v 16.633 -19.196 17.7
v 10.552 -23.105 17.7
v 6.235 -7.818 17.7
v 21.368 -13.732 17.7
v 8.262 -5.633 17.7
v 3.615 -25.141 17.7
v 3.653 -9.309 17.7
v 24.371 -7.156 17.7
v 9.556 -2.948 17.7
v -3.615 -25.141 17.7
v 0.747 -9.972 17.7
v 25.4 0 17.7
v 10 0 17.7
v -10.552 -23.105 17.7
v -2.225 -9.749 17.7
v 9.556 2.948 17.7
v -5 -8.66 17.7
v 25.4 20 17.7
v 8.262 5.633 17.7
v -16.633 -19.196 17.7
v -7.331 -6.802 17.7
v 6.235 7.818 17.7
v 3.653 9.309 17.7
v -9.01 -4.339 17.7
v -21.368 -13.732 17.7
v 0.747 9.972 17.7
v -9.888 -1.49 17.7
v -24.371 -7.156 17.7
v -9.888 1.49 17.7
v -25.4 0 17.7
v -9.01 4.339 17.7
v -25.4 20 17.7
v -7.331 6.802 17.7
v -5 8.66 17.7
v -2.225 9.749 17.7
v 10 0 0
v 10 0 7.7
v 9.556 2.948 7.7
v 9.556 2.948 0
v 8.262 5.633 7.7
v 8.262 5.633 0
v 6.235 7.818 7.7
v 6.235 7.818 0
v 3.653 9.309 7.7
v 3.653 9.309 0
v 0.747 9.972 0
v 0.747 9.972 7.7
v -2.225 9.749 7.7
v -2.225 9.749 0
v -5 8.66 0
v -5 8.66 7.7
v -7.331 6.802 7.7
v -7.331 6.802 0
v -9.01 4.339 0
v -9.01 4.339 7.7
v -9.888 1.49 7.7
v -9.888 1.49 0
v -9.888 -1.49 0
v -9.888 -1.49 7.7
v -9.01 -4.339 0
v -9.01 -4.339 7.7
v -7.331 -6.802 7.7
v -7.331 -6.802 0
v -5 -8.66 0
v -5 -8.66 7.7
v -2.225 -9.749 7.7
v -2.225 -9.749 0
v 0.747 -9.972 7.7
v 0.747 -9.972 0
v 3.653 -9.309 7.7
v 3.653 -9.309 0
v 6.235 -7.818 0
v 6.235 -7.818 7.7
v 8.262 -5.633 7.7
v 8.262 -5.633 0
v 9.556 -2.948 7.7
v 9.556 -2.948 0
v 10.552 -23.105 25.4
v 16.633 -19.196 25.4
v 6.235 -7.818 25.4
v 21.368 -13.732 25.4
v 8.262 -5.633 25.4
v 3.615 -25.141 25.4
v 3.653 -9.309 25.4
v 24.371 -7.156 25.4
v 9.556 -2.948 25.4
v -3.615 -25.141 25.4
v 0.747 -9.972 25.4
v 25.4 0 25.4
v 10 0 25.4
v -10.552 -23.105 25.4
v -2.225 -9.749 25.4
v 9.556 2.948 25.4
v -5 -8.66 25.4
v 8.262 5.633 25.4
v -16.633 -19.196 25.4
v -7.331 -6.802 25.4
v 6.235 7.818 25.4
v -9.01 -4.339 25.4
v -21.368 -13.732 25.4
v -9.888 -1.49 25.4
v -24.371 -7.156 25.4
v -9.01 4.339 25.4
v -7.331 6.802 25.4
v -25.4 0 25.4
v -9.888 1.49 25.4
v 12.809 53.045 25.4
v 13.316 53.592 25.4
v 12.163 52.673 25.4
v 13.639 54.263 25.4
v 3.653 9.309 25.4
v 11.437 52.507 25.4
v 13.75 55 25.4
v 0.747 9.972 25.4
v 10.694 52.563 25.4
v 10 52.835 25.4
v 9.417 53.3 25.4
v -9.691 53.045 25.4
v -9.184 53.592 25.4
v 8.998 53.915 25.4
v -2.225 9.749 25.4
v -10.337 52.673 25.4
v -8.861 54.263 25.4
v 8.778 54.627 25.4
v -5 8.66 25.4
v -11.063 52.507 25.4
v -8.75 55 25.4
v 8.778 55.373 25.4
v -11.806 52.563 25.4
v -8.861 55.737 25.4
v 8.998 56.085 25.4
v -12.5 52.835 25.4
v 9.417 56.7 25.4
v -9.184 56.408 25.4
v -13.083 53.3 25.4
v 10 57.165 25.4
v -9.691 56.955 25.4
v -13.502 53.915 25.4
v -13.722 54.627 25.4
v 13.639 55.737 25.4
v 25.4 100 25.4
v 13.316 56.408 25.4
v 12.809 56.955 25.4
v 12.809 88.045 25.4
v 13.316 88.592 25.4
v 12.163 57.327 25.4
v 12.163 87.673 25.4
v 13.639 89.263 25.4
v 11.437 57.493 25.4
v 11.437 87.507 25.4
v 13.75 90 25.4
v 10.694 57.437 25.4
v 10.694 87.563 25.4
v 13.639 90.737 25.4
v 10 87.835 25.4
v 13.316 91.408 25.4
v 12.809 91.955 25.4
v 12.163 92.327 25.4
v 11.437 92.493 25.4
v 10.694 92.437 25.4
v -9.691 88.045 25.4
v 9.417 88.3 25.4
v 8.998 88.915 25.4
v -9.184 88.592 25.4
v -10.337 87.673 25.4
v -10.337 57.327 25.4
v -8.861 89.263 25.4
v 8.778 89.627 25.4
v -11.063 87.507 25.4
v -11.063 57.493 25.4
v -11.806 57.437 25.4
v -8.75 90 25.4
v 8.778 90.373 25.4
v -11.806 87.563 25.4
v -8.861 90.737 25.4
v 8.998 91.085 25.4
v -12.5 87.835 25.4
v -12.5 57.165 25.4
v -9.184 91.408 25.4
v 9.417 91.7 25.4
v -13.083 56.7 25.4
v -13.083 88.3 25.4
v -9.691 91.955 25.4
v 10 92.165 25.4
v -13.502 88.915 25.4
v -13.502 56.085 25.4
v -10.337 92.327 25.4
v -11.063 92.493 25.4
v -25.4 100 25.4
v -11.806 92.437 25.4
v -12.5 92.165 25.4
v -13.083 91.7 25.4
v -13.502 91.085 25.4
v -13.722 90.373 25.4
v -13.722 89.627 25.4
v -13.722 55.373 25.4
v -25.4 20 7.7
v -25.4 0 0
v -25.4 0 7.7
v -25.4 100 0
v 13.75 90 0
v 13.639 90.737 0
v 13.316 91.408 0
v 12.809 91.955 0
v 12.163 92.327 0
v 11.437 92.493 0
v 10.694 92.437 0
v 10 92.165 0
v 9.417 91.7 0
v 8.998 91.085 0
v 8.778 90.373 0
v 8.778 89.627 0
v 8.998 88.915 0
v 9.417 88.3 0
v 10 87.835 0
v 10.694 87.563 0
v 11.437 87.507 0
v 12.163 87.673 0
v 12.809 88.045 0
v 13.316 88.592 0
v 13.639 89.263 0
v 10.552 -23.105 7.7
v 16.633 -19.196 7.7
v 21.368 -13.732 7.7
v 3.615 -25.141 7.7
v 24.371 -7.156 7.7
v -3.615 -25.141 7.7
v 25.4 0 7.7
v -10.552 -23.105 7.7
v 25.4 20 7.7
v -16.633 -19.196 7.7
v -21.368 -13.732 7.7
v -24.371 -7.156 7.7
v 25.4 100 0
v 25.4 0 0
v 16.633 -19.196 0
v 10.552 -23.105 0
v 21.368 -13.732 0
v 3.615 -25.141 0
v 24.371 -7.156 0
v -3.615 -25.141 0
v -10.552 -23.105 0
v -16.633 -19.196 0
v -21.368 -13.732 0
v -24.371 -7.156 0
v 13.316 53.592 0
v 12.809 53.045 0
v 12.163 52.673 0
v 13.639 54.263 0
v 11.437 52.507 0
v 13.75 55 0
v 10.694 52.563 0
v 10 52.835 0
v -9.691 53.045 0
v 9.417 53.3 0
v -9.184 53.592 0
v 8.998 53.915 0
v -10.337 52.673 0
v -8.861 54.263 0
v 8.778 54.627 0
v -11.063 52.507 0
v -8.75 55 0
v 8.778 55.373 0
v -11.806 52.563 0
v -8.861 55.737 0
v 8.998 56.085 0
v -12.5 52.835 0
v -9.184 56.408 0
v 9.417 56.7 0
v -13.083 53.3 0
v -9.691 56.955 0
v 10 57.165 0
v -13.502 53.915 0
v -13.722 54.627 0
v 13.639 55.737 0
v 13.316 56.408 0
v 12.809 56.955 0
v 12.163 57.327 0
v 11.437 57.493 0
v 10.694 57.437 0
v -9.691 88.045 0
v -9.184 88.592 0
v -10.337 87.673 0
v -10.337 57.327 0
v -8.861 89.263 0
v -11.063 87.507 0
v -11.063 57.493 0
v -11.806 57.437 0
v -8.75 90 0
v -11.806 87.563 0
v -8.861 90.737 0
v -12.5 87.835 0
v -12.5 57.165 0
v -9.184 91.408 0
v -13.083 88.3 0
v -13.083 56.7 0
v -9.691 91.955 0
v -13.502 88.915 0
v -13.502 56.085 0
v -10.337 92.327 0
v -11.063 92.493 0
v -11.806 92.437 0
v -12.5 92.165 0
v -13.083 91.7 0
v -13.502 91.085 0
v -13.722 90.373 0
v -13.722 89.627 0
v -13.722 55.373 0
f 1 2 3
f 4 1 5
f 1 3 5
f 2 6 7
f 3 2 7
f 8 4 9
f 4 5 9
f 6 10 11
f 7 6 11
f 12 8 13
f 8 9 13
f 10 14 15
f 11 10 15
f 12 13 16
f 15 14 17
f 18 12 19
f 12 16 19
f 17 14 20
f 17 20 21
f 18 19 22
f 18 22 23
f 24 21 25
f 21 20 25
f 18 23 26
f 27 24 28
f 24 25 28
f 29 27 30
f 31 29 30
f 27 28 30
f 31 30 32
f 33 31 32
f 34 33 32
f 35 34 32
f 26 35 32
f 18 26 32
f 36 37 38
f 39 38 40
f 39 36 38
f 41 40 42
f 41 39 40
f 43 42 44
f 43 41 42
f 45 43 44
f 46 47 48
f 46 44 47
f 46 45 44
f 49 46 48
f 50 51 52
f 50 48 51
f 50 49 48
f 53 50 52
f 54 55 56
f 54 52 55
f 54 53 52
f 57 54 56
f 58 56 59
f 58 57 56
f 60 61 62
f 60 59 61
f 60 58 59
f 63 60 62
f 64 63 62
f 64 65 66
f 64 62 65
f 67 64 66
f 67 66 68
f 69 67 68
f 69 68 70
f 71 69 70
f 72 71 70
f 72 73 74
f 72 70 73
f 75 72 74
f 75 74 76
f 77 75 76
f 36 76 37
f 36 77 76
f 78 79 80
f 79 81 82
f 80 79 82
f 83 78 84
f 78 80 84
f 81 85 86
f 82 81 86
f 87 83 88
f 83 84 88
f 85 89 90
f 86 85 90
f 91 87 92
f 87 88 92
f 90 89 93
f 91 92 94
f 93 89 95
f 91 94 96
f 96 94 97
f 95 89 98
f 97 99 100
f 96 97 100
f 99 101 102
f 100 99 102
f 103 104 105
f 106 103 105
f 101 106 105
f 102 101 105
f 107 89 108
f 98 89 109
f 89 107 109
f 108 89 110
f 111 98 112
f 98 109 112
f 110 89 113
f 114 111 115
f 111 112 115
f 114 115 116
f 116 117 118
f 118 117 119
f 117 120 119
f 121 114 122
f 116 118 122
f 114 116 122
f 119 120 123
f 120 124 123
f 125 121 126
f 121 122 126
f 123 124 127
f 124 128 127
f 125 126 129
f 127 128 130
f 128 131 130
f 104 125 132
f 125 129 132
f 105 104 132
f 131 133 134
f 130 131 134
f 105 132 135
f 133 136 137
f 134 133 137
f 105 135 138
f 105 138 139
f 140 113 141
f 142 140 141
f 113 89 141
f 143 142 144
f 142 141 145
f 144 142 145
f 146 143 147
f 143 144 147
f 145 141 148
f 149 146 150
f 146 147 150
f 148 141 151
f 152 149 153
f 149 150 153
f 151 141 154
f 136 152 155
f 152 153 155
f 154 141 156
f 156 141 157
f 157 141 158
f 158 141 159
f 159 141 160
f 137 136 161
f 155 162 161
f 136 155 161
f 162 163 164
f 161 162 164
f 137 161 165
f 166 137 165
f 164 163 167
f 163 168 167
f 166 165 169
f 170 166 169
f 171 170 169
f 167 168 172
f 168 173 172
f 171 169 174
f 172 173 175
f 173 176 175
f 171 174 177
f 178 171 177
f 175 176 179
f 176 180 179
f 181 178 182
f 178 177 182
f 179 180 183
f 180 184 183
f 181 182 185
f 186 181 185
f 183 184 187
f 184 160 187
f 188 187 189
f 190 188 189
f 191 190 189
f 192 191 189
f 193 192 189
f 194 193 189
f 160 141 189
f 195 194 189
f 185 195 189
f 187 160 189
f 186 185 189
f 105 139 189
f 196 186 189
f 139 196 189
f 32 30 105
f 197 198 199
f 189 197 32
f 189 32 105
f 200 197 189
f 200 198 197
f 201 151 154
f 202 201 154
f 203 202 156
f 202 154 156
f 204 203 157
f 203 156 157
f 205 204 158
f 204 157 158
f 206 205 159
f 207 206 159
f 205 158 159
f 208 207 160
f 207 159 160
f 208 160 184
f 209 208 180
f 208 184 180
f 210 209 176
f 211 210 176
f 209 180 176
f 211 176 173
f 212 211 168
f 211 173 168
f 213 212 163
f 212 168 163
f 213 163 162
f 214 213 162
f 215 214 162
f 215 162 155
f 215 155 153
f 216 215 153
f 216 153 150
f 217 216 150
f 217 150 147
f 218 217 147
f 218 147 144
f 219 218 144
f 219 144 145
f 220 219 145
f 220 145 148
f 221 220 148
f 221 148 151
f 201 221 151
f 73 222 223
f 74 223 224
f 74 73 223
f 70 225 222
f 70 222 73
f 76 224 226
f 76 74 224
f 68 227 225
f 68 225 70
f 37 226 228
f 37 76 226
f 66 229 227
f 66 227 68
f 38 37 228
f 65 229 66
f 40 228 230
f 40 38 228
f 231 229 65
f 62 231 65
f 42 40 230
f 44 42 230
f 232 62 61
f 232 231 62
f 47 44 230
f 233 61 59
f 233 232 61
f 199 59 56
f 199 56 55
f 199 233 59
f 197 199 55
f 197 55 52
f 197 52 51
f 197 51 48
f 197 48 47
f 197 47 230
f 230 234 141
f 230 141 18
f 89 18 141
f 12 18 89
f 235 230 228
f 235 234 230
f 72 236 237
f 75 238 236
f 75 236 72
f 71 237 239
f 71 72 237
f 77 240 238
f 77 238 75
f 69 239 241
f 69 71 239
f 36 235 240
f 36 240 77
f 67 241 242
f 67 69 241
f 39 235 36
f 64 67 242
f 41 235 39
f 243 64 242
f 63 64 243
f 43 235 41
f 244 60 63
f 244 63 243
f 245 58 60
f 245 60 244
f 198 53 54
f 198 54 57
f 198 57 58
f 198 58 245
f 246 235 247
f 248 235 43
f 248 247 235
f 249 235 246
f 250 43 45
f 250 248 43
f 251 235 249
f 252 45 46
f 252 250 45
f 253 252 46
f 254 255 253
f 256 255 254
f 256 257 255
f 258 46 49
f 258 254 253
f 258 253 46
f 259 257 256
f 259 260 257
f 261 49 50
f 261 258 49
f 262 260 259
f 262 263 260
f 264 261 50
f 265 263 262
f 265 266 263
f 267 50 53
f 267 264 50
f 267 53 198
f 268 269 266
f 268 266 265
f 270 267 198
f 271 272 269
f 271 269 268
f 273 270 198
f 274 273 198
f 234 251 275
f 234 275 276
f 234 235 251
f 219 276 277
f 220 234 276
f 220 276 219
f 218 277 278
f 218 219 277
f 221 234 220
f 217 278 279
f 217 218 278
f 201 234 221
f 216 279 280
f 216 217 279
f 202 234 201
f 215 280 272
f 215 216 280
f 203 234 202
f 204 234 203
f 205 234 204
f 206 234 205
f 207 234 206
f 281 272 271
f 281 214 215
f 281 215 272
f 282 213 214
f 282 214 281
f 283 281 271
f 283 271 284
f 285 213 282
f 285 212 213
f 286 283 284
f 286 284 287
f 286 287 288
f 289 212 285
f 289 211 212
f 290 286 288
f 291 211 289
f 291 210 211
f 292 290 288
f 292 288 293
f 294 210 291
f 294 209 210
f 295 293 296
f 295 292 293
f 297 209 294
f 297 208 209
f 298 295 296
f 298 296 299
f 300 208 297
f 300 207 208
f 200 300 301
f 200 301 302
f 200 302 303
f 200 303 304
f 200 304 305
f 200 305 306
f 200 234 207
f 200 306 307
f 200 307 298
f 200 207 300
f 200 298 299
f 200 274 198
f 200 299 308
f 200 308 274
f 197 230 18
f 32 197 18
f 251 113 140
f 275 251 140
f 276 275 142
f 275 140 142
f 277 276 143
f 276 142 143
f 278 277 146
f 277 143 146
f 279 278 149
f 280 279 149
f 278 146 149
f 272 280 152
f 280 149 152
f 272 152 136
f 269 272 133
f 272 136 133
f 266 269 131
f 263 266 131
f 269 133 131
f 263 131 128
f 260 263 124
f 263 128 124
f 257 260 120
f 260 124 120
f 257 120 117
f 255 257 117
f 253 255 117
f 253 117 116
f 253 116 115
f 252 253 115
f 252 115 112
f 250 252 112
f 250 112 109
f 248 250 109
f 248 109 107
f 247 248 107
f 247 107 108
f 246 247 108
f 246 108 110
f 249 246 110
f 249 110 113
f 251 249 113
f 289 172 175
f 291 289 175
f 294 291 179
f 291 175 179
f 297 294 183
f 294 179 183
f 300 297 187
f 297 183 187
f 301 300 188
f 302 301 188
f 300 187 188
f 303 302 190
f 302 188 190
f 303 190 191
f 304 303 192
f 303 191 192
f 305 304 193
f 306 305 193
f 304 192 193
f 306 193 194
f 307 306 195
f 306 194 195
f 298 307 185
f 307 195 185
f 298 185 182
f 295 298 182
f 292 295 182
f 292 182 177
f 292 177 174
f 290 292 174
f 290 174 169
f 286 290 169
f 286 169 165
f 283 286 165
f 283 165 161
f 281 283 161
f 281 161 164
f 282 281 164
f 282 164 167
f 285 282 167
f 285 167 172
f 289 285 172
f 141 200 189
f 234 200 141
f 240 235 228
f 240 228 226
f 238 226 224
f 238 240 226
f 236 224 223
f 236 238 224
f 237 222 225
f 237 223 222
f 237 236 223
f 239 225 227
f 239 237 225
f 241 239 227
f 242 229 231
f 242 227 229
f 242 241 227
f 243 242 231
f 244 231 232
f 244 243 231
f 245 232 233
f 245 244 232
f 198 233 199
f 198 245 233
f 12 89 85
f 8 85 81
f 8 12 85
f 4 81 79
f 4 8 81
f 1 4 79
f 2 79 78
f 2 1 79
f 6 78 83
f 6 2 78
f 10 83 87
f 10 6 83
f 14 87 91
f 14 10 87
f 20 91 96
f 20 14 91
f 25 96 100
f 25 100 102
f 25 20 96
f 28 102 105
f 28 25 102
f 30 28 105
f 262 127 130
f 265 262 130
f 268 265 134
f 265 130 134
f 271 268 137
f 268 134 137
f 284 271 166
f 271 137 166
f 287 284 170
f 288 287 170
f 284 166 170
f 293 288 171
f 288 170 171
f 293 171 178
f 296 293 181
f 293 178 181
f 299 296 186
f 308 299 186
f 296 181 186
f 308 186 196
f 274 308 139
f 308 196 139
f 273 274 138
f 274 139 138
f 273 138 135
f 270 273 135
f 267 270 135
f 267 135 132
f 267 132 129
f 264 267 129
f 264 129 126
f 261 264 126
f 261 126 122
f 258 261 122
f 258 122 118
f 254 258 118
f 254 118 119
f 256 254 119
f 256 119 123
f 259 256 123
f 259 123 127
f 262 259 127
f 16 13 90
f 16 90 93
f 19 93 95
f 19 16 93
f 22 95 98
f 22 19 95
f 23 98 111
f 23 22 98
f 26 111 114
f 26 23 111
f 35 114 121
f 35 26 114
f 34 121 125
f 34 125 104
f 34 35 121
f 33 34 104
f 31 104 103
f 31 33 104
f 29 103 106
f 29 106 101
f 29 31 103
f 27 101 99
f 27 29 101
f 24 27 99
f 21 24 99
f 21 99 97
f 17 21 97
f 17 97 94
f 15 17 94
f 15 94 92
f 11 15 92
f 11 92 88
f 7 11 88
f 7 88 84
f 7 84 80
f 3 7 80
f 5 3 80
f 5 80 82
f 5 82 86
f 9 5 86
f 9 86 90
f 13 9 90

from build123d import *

# Parameters (mm, degrees)
SKETCH1_R           = 10
BOSS_EXTRUDE1_DEPTH = 25.4
SKETCH2_W           = 10
SKETCH2_H           = 45.4
CUT_EXTRUDE1_DEPTH  = 116.003478208
SKETCH3_R           = 2.5
CUT_EXTRUDE2_DEPTH  = 107.255917482


with BuildPart() as part:
    # Sketch1 → Boss-Extrude1 (new body)
    with BuildSketch(Plane.XY):
        with BuildLine():
            Line((-25.4, 0), (-25.4, 100))
            Line((-25.4, 100), (25.4, 100))
            Line((25.4, 100), (25.4, 0))
            ThreePointArc((25.4, 0), (0, -25.4), (-25.4, 0))
        make_face()
        Circle(SKETCH1_R, mode=Mode.SUBTRACT)
    extrude(amount=BOSS_EXTRUDE1_DEPTH)

    # Sketch2 → Cut-Extrude1 (cut, through all)
    with BuildSketch(Plane.ZY.offset(25.4)):
        with Locations((12.7, -2.7)):
            Rectangle(SKETCH2_W, SKETCH2_H)
    extrude(amount=-CUT_EXTRUDE1_DEPTH, mode=Mode.SUBTRACT)

    # Sketch3 → Cut-Extrude2 (cut, through all)
    with BuildSketch(Plane.XY.offset(25.4)):
        with Locations((-11.25, 90)):
            Circle(SKETCH3_R)
        with Locations((11.25, 90)):
            Circle(SKETCH3_R)
        with Locations((11.25, 55)):
            Circle(SKETCH3_R)
        with Locations((-11.25, 55)):
            Circle(SKETCH3_R)
    extrude(amount=-CUT_EXTRUDE2_DEPTH, mode=Mode.SUBTRACT)


solid = part.part
